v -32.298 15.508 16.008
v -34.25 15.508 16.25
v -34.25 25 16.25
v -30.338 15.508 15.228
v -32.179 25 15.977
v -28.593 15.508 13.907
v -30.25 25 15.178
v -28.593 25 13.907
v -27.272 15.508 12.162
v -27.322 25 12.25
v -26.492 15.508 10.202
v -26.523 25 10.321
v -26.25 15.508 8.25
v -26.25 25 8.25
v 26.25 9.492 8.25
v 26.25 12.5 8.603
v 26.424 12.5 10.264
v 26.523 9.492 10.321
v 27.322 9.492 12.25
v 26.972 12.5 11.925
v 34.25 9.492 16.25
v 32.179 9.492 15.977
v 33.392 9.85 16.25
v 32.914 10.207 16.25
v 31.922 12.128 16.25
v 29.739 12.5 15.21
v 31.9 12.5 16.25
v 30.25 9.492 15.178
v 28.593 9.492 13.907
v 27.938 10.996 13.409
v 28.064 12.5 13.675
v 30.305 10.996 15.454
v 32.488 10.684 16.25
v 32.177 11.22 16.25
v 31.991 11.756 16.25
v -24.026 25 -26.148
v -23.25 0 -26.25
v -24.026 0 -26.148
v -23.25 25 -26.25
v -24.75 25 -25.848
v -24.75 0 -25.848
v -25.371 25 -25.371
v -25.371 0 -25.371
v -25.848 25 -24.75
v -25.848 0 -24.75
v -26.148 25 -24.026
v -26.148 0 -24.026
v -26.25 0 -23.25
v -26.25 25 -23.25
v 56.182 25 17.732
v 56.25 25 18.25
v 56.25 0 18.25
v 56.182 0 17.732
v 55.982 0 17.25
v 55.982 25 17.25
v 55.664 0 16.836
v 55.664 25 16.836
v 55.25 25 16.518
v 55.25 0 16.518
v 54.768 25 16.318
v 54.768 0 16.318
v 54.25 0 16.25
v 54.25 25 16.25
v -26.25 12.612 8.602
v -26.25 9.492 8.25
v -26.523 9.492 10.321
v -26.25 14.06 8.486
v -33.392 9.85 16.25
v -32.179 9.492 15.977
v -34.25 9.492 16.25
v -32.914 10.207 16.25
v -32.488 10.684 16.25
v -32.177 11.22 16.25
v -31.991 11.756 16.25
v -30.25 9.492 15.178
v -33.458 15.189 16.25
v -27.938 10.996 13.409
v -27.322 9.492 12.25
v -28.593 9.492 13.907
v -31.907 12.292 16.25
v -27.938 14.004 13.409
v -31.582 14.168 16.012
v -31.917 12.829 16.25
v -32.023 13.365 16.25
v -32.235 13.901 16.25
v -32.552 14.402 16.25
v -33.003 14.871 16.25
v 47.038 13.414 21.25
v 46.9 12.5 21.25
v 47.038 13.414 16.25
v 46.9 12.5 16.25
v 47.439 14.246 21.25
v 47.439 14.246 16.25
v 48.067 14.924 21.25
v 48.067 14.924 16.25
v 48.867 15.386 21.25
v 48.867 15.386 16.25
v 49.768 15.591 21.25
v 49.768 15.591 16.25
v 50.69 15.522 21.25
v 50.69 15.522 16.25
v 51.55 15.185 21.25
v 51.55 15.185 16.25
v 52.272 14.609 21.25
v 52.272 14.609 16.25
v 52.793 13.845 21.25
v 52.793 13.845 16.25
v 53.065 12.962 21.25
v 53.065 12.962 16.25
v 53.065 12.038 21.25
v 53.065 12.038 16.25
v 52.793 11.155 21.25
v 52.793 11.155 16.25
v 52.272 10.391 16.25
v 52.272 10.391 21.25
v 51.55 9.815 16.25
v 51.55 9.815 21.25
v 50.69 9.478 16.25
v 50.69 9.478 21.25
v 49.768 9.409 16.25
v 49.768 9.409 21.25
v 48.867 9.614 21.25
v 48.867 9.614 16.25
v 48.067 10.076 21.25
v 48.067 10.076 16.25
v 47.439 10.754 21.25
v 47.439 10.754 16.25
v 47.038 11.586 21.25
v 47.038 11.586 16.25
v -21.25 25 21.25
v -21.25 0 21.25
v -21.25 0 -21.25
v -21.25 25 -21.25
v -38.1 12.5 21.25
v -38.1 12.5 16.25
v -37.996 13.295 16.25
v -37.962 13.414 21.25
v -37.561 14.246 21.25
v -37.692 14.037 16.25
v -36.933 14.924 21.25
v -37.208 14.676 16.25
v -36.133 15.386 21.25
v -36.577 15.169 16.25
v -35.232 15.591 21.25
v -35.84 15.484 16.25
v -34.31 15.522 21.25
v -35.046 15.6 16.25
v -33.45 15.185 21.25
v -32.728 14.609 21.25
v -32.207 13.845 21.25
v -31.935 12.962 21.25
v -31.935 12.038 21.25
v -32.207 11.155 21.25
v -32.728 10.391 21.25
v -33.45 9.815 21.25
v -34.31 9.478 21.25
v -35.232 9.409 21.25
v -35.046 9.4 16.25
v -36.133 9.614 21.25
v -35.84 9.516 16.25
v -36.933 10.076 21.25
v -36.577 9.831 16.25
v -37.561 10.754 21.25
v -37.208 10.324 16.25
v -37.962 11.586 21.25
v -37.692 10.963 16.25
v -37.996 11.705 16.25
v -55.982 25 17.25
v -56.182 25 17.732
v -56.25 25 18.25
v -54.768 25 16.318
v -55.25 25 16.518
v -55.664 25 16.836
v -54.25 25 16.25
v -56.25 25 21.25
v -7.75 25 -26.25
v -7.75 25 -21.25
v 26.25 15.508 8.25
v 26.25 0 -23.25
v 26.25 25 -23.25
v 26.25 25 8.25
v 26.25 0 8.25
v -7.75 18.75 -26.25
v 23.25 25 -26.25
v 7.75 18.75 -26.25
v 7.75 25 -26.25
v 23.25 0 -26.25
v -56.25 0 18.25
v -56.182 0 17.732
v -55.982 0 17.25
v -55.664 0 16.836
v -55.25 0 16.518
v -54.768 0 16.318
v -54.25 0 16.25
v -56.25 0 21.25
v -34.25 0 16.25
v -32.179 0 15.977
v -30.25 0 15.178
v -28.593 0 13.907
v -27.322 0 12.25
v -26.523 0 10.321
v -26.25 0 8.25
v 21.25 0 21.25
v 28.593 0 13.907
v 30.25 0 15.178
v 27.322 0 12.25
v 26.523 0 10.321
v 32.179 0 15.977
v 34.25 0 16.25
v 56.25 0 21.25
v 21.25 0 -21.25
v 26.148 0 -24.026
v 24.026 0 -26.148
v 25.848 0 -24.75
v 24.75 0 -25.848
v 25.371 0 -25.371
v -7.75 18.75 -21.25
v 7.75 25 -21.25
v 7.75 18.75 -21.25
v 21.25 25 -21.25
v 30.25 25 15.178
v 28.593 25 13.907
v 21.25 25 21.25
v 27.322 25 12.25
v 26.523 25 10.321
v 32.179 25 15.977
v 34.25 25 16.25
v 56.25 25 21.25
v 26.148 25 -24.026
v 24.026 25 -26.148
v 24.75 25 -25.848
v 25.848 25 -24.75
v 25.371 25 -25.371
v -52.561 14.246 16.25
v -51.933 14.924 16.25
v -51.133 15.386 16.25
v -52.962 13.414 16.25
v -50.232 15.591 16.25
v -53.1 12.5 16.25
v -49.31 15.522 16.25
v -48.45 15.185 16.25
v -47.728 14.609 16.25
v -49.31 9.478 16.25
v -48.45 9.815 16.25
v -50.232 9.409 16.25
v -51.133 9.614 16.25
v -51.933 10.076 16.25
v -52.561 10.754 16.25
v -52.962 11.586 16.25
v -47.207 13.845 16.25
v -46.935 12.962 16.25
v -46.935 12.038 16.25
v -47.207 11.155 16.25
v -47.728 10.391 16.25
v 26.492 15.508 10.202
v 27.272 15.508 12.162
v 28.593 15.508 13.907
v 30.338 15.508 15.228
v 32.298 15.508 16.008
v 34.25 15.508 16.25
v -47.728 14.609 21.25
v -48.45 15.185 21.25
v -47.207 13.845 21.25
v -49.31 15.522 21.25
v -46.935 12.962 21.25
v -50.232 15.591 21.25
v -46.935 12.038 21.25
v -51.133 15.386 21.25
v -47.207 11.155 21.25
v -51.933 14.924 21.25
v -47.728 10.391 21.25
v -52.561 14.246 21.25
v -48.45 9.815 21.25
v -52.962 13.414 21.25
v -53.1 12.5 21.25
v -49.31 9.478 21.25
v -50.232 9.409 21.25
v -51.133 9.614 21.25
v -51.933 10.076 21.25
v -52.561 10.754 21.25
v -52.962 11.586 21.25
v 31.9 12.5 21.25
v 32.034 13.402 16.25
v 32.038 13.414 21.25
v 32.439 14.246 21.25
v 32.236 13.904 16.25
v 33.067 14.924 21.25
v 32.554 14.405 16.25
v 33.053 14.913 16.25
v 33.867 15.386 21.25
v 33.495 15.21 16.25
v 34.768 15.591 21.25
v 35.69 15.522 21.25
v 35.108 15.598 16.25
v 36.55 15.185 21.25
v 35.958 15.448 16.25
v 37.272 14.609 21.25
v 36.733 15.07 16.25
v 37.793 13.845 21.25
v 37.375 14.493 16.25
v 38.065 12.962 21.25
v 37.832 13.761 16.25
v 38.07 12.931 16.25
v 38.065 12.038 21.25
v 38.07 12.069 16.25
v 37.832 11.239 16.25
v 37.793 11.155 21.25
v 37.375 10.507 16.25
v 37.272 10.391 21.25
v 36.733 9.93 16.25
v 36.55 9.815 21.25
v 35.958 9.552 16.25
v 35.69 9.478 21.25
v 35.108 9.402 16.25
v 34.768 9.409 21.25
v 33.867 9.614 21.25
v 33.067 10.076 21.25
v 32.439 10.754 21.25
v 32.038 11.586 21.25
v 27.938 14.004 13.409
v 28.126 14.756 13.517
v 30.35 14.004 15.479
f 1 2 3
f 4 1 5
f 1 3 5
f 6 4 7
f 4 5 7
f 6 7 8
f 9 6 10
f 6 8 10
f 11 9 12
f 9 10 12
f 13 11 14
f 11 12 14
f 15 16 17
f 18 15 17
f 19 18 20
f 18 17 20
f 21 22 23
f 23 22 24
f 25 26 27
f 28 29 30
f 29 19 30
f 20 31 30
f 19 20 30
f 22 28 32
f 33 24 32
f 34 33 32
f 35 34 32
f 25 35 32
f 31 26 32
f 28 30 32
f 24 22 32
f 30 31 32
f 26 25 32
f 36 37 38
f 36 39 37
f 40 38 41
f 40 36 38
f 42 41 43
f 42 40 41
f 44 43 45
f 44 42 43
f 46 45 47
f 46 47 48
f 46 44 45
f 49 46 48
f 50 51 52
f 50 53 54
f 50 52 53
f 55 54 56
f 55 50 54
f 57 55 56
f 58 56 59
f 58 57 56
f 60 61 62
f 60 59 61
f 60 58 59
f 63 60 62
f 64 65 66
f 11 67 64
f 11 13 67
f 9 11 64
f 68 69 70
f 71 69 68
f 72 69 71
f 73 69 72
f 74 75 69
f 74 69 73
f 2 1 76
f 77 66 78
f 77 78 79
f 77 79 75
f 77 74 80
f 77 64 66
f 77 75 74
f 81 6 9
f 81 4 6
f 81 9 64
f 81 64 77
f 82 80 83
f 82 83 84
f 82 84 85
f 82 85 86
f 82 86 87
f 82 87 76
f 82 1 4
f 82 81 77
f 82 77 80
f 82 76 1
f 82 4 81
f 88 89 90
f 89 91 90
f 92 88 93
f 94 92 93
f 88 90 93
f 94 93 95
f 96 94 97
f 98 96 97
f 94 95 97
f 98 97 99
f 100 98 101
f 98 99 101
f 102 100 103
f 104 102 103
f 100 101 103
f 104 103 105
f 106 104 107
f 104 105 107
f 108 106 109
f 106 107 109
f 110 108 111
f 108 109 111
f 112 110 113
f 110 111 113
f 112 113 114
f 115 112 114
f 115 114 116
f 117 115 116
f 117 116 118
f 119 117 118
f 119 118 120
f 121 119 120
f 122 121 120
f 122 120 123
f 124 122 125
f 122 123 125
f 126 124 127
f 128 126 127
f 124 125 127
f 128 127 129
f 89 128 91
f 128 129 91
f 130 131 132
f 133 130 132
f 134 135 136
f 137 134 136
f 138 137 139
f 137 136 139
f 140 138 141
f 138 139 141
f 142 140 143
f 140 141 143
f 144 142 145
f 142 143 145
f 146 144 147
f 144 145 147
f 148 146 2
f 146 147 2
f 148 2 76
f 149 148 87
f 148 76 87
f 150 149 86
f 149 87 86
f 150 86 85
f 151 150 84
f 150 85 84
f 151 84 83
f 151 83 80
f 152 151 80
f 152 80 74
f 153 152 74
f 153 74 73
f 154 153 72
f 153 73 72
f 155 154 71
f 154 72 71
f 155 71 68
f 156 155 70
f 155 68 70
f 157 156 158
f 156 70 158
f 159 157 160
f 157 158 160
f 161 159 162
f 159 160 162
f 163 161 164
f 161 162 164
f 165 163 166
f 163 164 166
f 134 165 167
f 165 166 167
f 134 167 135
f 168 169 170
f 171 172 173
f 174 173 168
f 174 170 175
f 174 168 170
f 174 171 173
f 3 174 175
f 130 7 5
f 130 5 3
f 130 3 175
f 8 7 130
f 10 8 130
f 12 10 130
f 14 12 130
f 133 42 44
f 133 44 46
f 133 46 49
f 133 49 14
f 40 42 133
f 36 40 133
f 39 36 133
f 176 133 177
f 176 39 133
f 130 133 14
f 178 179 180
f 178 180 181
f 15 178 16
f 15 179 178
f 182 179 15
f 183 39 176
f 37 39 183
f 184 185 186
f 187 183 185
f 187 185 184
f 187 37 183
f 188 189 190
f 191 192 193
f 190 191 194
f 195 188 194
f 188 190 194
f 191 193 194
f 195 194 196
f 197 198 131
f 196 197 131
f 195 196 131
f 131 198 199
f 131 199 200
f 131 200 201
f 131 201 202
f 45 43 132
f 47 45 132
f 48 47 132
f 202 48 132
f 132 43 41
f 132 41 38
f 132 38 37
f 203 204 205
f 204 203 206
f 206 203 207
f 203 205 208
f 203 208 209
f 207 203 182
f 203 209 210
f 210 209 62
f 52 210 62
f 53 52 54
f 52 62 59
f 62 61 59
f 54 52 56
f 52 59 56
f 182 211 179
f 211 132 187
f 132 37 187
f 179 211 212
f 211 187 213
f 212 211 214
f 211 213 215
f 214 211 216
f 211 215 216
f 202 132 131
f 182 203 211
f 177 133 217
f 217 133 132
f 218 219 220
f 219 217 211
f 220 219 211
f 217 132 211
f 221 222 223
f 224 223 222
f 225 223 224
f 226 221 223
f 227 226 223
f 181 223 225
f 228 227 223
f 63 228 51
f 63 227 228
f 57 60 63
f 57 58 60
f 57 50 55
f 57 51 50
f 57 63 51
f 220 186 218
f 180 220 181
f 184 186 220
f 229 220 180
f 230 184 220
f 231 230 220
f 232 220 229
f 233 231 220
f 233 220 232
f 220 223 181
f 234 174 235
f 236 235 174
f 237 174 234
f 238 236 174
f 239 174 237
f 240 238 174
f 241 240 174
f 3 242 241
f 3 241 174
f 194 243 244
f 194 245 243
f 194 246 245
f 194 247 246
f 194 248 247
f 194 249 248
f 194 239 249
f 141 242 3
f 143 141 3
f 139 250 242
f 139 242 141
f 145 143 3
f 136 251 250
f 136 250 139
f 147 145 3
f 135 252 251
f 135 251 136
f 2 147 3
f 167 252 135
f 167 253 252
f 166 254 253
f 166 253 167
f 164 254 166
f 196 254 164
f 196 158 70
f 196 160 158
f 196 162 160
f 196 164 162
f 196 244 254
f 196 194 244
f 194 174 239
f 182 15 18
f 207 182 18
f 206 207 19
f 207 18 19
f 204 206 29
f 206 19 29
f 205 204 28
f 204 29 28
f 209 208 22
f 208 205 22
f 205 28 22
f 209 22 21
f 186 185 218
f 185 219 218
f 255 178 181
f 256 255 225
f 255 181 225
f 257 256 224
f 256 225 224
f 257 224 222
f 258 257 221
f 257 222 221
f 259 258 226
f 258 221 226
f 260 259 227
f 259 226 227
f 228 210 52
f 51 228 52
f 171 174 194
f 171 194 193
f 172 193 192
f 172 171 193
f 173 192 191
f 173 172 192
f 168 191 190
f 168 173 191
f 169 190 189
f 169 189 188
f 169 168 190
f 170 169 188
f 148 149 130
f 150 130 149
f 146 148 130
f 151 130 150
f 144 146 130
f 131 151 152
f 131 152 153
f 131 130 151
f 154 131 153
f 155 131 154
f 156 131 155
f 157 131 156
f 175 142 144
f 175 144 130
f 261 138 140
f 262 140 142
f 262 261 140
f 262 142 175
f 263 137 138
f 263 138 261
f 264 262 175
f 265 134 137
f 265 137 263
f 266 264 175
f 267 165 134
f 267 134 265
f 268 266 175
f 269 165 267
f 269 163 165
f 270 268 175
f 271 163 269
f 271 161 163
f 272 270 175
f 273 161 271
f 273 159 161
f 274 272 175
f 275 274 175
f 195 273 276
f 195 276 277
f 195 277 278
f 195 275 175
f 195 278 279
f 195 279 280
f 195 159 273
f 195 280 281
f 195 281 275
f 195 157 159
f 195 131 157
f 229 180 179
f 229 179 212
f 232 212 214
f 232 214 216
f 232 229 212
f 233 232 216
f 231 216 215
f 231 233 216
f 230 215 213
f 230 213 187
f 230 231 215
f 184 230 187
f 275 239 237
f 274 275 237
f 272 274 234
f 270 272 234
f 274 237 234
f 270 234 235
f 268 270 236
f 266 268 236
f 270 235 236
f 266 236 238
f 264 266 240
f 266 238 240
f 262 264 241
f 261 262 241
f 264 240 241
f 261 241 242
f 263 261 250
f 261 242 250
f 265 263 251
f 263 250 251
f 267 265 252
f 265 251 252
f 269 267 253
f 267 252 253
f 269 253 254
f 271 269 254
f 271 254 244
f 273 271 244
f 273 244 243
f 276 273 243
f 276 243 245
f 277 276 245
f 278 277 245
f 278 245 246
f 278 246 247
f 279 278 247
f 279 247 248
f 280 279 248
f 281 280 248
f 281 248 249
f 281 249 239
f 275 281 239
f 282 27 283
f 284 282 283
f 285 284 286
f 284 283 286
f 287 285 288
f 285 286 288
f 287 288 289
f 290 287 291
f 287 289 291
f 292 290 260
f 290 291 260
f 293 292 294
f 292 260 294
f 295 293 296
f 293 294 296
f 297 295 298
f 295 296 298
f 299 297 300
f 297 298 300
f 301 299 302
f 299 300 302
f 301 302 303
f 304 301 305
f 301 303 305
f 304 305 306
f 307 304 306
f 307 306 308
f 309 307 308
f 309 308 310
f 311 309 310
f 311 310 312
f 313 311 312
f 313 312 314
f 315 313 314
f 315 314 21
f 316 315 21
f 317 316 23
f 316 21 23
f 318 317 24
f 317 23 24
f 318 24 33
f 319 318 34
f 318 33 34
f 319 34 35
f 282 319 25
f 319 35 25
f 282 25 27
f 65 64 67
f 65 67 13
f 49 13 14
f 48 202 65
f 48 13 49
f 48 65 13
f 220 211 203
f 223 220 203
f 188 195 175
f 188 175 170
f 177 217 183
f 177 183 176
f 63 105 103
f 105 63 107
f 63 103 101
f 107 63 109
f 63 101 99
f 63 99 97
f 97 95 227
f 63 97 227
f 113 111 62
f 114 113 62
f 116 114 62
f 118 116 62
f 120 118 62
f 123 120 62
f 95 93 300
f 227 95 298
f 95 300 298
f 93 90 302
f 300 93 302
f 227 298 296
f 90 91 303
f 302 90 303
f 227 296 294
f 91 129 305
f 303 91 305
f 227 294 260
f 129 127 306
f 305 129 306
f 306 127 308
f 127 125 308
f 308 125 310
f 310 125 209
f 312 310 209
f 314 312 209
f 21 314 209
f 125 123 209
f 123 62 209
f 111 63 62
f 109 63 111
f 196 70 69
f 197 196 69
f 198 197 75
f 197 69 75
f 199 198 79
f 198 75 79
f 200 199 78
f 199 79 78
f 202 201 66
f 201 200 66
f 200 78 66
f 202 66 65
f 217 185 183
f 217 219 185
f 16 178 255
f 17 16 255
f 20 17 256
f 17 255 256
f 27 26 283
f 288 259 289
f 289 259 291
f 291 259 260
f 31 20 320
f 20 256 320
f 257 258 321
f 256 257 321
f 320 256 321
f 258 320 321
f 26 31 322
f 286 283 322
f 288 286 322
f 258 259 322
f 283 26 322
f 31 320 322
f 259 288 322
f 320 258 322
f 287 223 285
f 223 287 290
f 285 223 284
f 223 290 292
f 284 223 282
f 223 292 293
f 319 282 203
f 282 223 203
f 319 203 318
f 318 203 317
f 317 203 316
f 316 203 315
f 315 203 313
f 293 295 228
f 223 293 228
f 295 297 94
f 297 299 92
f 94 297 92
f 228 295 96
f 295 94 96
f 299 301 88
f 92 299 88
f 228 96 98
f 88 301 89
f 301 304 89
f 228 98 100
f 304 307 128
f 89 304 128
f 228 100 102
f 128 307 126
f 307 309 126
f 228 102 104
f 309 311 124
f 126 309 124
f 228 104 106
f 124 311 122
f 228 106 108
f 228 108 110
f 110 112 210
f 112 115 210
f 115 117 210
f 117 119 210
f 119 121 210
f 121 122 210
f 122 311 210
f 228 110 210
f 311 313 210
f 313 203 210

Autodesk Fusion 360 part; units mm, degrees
sketch "Sketch1" plane through (0, 0, 0) normal (0, 1, 0) x (1, 0, 0)
  line L0 (21.25, -21.25) -> (-21.25, -21.25)
  line L1 (-21.25, -21.25) -> (-21.25, 21.25)
  line L2 (-21.25, 21.25) -> (21.25, 21.25)
  line L3 (21.25, 21.25) -> (21.25, -21.25)
  line L4 (21.25, -21.25) -> (-21.25, 21.25) construction
  line L5 (-21.25, -21.25) -> (21.25, 21.25) construction
  line L6 (-21.25, -21.25) -> (-56.25, -21.25)
  line L7 (-56.25, -21.25) -> (-56.25, -16.25)
  line L8 (-56.25, -16.25) -> (-21.25, -16.25)
  line L9 (0, -21.25) -> (0, -35)
  line L10 (-26.25, -21.25) -> (-26.25, 26.25)
  line L11 (-26.25, 26.25) -> (26.25, 26.25)
  line L12 (26.25, 26.25) -> (26.25, -21.25)
  line L13 (56.25, -16.25) -> (21.25, -16.25)
  line L14 (21.25, -21.25) -> (56.25, -21.25)
  line L15 (56.25, -21.25) -> (56.25, -16.25)
  dimension "d1" = 42.5
  dimension "d2" = 42.5
  dimension "d3" = 35
  dimension "d4" = 5
extrude "Extrude1" add sketch "Sketch1" along normal blind 25 contours L3 L12 L13 L14 | L1 L2 L3 L8 L10 L11 L12 L13 | L12 L13 L14 L15 | L1 L6 L8 L10 | L6 L7 L8 L10
sketch "Sketch2" plane through (0, 0, 16.25) normal (0, 0, -1) x (-1, 0, 0)
  line L0 (26.25, 0) -> (56.25, 0)
  line L1 (56.25, 0) -> (56.25, 25)
  line L2 (56.25, 25) -> (26.25, 25)
  line L3 (26.25, 25) -> (26.25, 0)
  line L4 (0, 12.5) -> (0, 7)
  circle A0 centre (50, 12.5) radius 3.1
  circle A1 centre (35, 12.5) radius 3.1
  circle A2 centre (-35, 12.5) radius 3.1
  circle A3 centre (-50, 12.5) radius 3.1
  line L5 (0, 25) -> (7.75, 25)
  line L6 (0, 18.75) -> (7.75, 18.75)
  line L7 (7.75, 18.75) -> (7.75, 25)
  line L8 (0, 18.75) -> (-7.75, 18.75)
  line L9 (-7.75, 18.75) -> (-7.75, 25)
  line L10 (0, 25) -> (-7.75, 25)
  point P0 (0, 12.5)
  dimension "d8" = 6.2
  dimension "d9" = 6.2
  dimension "d10" = 7.75
extrude "Extrude2" cut sketch "Sketch2" along normal mid plane 144 contours A0 | A1 | A2 | A3 | L5 L6 L7 L8 L9 L10
fillet "Fillet1" radius 8 2 edges at (-26.25, 12.5, 16.25) (26.25, 12.5, 16.25)
fillet "Fillet2" radius 3 2 edges at (-26.25, 12.5, -26.25) (26.25, 12.5, -26.25)
fillet "Fillet3" radius 2 2 edges at (-56.25, 12.5, 16.25) (56.25, 12.5, 16.25)
